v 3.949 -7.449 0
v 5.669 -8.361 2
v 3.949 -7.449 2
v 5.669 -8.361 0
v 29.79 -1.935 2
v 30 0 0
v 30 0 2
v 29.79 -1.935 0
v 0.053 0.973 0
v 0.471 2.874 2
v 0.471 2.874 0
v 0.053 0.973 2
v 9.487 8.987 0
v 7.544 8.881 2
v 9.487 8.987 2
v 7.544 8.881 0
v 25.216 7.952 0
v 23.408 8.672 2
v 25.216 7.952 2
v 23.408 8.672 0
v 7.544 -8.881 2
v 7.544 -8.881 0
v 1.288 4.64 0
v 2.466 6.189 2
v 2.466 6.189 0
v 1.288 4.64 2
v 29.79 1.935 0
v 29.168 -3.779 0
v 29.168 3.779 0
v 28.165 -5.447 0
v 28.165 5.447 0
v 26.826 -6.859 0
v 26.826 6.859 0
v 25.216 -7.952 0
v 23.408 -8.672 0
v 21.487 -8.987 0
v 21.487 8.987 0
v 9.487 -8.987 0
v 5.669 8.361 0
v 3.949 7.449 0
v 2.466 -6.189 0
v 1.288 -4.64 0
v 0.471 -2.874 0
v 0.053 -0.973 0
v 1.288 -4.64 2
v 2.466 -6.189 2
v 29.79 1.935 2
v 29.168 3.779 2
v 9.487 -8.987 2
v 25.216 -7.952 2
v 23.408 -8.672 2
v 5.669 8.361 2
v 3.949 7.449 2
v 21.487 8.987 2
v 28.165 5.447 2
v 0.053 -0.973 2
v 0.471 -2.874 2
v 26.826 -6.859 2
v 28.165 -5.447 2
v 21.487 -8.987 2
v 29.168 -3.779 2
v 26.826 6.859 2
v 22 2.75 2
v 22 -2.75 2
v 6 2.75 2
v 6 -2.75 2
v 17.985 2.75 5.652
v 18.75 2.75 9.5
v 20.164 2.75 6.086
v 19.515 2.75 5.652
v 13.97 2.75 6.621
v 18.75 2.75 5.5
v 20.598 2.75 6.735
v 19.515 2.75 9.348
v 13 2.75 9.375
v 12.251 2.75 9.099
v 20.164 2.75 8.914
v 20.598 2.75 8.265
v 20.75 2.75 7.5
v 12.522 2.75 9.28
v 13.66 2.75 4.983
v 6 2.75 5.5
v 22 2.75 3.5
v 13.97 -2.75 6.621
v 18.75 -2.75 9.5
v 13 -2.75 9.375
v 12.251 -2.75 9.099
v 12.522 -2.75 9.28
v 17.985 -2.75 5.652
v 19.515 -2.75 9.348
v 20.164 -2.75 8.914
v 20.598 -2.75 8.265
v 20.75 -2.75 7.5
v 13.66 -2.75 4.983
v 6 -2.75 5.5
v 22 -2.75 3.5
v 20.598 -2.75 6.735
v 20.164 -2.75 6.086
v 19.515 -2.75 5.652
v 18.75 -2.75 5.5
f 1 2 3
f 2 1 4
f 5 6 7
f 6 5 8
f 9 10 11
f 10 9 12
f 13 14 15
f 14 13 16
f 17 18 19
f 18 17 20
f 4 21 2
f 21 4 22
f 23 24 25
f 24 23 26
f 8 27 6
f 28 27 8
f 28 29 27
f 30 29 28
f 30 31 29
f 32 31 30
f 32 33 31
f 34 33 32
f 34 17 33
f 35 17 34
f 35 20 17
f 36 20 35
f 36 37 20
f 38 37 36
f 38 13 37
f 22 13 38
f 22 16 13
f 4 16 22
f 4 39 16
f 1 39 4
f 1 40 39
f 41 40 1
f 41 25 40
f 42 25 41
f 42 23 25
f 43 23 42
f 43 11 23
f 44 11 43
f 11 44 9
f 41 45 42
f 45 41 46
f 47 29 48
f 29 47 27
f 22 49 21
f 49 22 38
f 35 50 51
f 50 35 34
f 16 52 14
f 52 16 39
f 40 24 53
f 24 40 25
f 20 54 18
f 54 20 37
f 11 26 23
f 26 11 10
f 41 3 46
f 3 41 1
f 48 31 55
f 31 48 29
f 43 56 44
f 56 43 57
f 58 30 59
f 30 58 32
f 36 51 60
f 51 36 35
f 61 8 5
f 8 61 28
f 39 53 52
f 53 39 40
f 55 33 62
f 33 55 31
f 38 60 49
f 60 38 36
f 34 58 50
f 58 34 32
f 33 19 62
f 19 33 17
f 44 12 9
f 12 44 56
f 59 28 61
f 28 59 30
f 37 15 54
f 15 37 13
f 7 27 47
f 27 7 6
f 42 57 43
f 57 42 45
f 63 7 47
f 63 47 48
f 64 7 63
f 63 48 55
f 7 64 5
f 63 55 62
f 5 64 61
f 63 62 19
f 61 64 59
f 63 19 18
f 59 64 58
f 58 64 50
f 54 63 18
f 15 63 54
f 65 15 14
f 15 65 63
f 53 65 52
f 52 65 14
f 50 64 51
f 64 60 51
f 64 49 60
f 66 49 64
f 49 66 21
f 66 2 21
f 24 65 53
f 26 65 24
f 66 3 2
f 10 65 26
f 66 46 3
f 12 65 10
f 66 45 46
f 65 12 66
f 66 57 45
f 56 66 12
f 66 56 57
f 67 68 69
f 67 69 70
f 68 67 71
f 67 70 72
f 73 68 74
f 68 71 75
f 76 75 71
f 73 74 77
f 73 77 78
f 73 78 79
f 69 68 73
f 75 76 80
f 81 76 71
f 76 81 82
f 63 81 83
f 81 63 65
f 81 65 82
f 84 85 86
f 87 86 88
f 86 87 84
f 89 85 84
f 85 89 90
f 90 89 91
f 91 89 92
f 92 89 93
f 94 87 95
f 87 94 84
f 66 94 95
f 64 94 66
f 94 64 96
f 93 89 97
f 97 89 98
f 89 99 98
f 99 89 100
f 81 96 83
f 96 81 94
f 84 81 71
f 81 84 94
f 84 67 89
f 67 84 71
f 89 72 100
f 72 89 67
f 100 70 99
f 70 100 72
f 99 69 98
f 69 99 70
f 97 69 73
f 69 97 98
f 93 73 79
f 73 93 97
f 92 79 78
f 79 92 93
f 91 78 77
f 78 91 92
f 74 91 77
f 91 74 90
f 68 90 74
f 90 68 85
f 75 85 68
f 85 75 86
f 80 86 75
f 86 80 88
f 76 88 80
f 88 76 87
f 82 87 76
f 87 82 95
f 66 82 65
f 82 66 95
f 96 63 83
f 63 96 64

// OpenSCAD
baseHeight = 2;
baseRadius = 18 / 2; // 9
baseCenterWidth = 12; // 18 + 14 = 32 total width
module base() {
  baseWidth = baseRadius * 2 + baseCenterWidth; // 32
  translate([baseRadius,0,0])
  hull() {
    linear_extrude(height = baseHeight)
      translate([baseCenterWidth,0,0]) circle(baseRadius);
    linear_extrude(height = baseHeight)
        circle(baseRadius);
  }
}
base();

module hook2d(){
  $fn=16;
  hookRadius = 2.0;
  // hook at top
  smallHookRadius = 1.25;
  hull() {
    translate([0,smallHookRadius/ 2,0])
      circle(smallHookRadius);
    translate([7 - smallHookRadius,0,0])
      circle(hookRadius);
  }
  hull() {
    translate([0,smallHookRadius/ 2,0])
      circle(smallHookRadius);
    translate([-7,-6,0])
      square([2,2]);
  }
  hull() {
    translate([-2,-6,0])
      square([2,2]);
    translate([-smallHookRadius + 1.25,-smallHookRadius+1.85,0])
      circle(smallHookRadius);
    translate([-7,-6,0])
      square([2,4]);
  }
  hull() {
    translate([-smallHookRadius-1,-3.25,0])
      circle(smallHookRadius);
    translate([-2,-6,0])
      square([2,2]);
    translate([7,-6,0])
      square([2,2]);
  }
}
hookWidth = 5.5;
color("limegreen")
translate([baseCenterWidth + 1, 2.75, 8 - .5])
rotate([90,0,0])
  linear_extrude(height = hookWidth)
    hook2d();
